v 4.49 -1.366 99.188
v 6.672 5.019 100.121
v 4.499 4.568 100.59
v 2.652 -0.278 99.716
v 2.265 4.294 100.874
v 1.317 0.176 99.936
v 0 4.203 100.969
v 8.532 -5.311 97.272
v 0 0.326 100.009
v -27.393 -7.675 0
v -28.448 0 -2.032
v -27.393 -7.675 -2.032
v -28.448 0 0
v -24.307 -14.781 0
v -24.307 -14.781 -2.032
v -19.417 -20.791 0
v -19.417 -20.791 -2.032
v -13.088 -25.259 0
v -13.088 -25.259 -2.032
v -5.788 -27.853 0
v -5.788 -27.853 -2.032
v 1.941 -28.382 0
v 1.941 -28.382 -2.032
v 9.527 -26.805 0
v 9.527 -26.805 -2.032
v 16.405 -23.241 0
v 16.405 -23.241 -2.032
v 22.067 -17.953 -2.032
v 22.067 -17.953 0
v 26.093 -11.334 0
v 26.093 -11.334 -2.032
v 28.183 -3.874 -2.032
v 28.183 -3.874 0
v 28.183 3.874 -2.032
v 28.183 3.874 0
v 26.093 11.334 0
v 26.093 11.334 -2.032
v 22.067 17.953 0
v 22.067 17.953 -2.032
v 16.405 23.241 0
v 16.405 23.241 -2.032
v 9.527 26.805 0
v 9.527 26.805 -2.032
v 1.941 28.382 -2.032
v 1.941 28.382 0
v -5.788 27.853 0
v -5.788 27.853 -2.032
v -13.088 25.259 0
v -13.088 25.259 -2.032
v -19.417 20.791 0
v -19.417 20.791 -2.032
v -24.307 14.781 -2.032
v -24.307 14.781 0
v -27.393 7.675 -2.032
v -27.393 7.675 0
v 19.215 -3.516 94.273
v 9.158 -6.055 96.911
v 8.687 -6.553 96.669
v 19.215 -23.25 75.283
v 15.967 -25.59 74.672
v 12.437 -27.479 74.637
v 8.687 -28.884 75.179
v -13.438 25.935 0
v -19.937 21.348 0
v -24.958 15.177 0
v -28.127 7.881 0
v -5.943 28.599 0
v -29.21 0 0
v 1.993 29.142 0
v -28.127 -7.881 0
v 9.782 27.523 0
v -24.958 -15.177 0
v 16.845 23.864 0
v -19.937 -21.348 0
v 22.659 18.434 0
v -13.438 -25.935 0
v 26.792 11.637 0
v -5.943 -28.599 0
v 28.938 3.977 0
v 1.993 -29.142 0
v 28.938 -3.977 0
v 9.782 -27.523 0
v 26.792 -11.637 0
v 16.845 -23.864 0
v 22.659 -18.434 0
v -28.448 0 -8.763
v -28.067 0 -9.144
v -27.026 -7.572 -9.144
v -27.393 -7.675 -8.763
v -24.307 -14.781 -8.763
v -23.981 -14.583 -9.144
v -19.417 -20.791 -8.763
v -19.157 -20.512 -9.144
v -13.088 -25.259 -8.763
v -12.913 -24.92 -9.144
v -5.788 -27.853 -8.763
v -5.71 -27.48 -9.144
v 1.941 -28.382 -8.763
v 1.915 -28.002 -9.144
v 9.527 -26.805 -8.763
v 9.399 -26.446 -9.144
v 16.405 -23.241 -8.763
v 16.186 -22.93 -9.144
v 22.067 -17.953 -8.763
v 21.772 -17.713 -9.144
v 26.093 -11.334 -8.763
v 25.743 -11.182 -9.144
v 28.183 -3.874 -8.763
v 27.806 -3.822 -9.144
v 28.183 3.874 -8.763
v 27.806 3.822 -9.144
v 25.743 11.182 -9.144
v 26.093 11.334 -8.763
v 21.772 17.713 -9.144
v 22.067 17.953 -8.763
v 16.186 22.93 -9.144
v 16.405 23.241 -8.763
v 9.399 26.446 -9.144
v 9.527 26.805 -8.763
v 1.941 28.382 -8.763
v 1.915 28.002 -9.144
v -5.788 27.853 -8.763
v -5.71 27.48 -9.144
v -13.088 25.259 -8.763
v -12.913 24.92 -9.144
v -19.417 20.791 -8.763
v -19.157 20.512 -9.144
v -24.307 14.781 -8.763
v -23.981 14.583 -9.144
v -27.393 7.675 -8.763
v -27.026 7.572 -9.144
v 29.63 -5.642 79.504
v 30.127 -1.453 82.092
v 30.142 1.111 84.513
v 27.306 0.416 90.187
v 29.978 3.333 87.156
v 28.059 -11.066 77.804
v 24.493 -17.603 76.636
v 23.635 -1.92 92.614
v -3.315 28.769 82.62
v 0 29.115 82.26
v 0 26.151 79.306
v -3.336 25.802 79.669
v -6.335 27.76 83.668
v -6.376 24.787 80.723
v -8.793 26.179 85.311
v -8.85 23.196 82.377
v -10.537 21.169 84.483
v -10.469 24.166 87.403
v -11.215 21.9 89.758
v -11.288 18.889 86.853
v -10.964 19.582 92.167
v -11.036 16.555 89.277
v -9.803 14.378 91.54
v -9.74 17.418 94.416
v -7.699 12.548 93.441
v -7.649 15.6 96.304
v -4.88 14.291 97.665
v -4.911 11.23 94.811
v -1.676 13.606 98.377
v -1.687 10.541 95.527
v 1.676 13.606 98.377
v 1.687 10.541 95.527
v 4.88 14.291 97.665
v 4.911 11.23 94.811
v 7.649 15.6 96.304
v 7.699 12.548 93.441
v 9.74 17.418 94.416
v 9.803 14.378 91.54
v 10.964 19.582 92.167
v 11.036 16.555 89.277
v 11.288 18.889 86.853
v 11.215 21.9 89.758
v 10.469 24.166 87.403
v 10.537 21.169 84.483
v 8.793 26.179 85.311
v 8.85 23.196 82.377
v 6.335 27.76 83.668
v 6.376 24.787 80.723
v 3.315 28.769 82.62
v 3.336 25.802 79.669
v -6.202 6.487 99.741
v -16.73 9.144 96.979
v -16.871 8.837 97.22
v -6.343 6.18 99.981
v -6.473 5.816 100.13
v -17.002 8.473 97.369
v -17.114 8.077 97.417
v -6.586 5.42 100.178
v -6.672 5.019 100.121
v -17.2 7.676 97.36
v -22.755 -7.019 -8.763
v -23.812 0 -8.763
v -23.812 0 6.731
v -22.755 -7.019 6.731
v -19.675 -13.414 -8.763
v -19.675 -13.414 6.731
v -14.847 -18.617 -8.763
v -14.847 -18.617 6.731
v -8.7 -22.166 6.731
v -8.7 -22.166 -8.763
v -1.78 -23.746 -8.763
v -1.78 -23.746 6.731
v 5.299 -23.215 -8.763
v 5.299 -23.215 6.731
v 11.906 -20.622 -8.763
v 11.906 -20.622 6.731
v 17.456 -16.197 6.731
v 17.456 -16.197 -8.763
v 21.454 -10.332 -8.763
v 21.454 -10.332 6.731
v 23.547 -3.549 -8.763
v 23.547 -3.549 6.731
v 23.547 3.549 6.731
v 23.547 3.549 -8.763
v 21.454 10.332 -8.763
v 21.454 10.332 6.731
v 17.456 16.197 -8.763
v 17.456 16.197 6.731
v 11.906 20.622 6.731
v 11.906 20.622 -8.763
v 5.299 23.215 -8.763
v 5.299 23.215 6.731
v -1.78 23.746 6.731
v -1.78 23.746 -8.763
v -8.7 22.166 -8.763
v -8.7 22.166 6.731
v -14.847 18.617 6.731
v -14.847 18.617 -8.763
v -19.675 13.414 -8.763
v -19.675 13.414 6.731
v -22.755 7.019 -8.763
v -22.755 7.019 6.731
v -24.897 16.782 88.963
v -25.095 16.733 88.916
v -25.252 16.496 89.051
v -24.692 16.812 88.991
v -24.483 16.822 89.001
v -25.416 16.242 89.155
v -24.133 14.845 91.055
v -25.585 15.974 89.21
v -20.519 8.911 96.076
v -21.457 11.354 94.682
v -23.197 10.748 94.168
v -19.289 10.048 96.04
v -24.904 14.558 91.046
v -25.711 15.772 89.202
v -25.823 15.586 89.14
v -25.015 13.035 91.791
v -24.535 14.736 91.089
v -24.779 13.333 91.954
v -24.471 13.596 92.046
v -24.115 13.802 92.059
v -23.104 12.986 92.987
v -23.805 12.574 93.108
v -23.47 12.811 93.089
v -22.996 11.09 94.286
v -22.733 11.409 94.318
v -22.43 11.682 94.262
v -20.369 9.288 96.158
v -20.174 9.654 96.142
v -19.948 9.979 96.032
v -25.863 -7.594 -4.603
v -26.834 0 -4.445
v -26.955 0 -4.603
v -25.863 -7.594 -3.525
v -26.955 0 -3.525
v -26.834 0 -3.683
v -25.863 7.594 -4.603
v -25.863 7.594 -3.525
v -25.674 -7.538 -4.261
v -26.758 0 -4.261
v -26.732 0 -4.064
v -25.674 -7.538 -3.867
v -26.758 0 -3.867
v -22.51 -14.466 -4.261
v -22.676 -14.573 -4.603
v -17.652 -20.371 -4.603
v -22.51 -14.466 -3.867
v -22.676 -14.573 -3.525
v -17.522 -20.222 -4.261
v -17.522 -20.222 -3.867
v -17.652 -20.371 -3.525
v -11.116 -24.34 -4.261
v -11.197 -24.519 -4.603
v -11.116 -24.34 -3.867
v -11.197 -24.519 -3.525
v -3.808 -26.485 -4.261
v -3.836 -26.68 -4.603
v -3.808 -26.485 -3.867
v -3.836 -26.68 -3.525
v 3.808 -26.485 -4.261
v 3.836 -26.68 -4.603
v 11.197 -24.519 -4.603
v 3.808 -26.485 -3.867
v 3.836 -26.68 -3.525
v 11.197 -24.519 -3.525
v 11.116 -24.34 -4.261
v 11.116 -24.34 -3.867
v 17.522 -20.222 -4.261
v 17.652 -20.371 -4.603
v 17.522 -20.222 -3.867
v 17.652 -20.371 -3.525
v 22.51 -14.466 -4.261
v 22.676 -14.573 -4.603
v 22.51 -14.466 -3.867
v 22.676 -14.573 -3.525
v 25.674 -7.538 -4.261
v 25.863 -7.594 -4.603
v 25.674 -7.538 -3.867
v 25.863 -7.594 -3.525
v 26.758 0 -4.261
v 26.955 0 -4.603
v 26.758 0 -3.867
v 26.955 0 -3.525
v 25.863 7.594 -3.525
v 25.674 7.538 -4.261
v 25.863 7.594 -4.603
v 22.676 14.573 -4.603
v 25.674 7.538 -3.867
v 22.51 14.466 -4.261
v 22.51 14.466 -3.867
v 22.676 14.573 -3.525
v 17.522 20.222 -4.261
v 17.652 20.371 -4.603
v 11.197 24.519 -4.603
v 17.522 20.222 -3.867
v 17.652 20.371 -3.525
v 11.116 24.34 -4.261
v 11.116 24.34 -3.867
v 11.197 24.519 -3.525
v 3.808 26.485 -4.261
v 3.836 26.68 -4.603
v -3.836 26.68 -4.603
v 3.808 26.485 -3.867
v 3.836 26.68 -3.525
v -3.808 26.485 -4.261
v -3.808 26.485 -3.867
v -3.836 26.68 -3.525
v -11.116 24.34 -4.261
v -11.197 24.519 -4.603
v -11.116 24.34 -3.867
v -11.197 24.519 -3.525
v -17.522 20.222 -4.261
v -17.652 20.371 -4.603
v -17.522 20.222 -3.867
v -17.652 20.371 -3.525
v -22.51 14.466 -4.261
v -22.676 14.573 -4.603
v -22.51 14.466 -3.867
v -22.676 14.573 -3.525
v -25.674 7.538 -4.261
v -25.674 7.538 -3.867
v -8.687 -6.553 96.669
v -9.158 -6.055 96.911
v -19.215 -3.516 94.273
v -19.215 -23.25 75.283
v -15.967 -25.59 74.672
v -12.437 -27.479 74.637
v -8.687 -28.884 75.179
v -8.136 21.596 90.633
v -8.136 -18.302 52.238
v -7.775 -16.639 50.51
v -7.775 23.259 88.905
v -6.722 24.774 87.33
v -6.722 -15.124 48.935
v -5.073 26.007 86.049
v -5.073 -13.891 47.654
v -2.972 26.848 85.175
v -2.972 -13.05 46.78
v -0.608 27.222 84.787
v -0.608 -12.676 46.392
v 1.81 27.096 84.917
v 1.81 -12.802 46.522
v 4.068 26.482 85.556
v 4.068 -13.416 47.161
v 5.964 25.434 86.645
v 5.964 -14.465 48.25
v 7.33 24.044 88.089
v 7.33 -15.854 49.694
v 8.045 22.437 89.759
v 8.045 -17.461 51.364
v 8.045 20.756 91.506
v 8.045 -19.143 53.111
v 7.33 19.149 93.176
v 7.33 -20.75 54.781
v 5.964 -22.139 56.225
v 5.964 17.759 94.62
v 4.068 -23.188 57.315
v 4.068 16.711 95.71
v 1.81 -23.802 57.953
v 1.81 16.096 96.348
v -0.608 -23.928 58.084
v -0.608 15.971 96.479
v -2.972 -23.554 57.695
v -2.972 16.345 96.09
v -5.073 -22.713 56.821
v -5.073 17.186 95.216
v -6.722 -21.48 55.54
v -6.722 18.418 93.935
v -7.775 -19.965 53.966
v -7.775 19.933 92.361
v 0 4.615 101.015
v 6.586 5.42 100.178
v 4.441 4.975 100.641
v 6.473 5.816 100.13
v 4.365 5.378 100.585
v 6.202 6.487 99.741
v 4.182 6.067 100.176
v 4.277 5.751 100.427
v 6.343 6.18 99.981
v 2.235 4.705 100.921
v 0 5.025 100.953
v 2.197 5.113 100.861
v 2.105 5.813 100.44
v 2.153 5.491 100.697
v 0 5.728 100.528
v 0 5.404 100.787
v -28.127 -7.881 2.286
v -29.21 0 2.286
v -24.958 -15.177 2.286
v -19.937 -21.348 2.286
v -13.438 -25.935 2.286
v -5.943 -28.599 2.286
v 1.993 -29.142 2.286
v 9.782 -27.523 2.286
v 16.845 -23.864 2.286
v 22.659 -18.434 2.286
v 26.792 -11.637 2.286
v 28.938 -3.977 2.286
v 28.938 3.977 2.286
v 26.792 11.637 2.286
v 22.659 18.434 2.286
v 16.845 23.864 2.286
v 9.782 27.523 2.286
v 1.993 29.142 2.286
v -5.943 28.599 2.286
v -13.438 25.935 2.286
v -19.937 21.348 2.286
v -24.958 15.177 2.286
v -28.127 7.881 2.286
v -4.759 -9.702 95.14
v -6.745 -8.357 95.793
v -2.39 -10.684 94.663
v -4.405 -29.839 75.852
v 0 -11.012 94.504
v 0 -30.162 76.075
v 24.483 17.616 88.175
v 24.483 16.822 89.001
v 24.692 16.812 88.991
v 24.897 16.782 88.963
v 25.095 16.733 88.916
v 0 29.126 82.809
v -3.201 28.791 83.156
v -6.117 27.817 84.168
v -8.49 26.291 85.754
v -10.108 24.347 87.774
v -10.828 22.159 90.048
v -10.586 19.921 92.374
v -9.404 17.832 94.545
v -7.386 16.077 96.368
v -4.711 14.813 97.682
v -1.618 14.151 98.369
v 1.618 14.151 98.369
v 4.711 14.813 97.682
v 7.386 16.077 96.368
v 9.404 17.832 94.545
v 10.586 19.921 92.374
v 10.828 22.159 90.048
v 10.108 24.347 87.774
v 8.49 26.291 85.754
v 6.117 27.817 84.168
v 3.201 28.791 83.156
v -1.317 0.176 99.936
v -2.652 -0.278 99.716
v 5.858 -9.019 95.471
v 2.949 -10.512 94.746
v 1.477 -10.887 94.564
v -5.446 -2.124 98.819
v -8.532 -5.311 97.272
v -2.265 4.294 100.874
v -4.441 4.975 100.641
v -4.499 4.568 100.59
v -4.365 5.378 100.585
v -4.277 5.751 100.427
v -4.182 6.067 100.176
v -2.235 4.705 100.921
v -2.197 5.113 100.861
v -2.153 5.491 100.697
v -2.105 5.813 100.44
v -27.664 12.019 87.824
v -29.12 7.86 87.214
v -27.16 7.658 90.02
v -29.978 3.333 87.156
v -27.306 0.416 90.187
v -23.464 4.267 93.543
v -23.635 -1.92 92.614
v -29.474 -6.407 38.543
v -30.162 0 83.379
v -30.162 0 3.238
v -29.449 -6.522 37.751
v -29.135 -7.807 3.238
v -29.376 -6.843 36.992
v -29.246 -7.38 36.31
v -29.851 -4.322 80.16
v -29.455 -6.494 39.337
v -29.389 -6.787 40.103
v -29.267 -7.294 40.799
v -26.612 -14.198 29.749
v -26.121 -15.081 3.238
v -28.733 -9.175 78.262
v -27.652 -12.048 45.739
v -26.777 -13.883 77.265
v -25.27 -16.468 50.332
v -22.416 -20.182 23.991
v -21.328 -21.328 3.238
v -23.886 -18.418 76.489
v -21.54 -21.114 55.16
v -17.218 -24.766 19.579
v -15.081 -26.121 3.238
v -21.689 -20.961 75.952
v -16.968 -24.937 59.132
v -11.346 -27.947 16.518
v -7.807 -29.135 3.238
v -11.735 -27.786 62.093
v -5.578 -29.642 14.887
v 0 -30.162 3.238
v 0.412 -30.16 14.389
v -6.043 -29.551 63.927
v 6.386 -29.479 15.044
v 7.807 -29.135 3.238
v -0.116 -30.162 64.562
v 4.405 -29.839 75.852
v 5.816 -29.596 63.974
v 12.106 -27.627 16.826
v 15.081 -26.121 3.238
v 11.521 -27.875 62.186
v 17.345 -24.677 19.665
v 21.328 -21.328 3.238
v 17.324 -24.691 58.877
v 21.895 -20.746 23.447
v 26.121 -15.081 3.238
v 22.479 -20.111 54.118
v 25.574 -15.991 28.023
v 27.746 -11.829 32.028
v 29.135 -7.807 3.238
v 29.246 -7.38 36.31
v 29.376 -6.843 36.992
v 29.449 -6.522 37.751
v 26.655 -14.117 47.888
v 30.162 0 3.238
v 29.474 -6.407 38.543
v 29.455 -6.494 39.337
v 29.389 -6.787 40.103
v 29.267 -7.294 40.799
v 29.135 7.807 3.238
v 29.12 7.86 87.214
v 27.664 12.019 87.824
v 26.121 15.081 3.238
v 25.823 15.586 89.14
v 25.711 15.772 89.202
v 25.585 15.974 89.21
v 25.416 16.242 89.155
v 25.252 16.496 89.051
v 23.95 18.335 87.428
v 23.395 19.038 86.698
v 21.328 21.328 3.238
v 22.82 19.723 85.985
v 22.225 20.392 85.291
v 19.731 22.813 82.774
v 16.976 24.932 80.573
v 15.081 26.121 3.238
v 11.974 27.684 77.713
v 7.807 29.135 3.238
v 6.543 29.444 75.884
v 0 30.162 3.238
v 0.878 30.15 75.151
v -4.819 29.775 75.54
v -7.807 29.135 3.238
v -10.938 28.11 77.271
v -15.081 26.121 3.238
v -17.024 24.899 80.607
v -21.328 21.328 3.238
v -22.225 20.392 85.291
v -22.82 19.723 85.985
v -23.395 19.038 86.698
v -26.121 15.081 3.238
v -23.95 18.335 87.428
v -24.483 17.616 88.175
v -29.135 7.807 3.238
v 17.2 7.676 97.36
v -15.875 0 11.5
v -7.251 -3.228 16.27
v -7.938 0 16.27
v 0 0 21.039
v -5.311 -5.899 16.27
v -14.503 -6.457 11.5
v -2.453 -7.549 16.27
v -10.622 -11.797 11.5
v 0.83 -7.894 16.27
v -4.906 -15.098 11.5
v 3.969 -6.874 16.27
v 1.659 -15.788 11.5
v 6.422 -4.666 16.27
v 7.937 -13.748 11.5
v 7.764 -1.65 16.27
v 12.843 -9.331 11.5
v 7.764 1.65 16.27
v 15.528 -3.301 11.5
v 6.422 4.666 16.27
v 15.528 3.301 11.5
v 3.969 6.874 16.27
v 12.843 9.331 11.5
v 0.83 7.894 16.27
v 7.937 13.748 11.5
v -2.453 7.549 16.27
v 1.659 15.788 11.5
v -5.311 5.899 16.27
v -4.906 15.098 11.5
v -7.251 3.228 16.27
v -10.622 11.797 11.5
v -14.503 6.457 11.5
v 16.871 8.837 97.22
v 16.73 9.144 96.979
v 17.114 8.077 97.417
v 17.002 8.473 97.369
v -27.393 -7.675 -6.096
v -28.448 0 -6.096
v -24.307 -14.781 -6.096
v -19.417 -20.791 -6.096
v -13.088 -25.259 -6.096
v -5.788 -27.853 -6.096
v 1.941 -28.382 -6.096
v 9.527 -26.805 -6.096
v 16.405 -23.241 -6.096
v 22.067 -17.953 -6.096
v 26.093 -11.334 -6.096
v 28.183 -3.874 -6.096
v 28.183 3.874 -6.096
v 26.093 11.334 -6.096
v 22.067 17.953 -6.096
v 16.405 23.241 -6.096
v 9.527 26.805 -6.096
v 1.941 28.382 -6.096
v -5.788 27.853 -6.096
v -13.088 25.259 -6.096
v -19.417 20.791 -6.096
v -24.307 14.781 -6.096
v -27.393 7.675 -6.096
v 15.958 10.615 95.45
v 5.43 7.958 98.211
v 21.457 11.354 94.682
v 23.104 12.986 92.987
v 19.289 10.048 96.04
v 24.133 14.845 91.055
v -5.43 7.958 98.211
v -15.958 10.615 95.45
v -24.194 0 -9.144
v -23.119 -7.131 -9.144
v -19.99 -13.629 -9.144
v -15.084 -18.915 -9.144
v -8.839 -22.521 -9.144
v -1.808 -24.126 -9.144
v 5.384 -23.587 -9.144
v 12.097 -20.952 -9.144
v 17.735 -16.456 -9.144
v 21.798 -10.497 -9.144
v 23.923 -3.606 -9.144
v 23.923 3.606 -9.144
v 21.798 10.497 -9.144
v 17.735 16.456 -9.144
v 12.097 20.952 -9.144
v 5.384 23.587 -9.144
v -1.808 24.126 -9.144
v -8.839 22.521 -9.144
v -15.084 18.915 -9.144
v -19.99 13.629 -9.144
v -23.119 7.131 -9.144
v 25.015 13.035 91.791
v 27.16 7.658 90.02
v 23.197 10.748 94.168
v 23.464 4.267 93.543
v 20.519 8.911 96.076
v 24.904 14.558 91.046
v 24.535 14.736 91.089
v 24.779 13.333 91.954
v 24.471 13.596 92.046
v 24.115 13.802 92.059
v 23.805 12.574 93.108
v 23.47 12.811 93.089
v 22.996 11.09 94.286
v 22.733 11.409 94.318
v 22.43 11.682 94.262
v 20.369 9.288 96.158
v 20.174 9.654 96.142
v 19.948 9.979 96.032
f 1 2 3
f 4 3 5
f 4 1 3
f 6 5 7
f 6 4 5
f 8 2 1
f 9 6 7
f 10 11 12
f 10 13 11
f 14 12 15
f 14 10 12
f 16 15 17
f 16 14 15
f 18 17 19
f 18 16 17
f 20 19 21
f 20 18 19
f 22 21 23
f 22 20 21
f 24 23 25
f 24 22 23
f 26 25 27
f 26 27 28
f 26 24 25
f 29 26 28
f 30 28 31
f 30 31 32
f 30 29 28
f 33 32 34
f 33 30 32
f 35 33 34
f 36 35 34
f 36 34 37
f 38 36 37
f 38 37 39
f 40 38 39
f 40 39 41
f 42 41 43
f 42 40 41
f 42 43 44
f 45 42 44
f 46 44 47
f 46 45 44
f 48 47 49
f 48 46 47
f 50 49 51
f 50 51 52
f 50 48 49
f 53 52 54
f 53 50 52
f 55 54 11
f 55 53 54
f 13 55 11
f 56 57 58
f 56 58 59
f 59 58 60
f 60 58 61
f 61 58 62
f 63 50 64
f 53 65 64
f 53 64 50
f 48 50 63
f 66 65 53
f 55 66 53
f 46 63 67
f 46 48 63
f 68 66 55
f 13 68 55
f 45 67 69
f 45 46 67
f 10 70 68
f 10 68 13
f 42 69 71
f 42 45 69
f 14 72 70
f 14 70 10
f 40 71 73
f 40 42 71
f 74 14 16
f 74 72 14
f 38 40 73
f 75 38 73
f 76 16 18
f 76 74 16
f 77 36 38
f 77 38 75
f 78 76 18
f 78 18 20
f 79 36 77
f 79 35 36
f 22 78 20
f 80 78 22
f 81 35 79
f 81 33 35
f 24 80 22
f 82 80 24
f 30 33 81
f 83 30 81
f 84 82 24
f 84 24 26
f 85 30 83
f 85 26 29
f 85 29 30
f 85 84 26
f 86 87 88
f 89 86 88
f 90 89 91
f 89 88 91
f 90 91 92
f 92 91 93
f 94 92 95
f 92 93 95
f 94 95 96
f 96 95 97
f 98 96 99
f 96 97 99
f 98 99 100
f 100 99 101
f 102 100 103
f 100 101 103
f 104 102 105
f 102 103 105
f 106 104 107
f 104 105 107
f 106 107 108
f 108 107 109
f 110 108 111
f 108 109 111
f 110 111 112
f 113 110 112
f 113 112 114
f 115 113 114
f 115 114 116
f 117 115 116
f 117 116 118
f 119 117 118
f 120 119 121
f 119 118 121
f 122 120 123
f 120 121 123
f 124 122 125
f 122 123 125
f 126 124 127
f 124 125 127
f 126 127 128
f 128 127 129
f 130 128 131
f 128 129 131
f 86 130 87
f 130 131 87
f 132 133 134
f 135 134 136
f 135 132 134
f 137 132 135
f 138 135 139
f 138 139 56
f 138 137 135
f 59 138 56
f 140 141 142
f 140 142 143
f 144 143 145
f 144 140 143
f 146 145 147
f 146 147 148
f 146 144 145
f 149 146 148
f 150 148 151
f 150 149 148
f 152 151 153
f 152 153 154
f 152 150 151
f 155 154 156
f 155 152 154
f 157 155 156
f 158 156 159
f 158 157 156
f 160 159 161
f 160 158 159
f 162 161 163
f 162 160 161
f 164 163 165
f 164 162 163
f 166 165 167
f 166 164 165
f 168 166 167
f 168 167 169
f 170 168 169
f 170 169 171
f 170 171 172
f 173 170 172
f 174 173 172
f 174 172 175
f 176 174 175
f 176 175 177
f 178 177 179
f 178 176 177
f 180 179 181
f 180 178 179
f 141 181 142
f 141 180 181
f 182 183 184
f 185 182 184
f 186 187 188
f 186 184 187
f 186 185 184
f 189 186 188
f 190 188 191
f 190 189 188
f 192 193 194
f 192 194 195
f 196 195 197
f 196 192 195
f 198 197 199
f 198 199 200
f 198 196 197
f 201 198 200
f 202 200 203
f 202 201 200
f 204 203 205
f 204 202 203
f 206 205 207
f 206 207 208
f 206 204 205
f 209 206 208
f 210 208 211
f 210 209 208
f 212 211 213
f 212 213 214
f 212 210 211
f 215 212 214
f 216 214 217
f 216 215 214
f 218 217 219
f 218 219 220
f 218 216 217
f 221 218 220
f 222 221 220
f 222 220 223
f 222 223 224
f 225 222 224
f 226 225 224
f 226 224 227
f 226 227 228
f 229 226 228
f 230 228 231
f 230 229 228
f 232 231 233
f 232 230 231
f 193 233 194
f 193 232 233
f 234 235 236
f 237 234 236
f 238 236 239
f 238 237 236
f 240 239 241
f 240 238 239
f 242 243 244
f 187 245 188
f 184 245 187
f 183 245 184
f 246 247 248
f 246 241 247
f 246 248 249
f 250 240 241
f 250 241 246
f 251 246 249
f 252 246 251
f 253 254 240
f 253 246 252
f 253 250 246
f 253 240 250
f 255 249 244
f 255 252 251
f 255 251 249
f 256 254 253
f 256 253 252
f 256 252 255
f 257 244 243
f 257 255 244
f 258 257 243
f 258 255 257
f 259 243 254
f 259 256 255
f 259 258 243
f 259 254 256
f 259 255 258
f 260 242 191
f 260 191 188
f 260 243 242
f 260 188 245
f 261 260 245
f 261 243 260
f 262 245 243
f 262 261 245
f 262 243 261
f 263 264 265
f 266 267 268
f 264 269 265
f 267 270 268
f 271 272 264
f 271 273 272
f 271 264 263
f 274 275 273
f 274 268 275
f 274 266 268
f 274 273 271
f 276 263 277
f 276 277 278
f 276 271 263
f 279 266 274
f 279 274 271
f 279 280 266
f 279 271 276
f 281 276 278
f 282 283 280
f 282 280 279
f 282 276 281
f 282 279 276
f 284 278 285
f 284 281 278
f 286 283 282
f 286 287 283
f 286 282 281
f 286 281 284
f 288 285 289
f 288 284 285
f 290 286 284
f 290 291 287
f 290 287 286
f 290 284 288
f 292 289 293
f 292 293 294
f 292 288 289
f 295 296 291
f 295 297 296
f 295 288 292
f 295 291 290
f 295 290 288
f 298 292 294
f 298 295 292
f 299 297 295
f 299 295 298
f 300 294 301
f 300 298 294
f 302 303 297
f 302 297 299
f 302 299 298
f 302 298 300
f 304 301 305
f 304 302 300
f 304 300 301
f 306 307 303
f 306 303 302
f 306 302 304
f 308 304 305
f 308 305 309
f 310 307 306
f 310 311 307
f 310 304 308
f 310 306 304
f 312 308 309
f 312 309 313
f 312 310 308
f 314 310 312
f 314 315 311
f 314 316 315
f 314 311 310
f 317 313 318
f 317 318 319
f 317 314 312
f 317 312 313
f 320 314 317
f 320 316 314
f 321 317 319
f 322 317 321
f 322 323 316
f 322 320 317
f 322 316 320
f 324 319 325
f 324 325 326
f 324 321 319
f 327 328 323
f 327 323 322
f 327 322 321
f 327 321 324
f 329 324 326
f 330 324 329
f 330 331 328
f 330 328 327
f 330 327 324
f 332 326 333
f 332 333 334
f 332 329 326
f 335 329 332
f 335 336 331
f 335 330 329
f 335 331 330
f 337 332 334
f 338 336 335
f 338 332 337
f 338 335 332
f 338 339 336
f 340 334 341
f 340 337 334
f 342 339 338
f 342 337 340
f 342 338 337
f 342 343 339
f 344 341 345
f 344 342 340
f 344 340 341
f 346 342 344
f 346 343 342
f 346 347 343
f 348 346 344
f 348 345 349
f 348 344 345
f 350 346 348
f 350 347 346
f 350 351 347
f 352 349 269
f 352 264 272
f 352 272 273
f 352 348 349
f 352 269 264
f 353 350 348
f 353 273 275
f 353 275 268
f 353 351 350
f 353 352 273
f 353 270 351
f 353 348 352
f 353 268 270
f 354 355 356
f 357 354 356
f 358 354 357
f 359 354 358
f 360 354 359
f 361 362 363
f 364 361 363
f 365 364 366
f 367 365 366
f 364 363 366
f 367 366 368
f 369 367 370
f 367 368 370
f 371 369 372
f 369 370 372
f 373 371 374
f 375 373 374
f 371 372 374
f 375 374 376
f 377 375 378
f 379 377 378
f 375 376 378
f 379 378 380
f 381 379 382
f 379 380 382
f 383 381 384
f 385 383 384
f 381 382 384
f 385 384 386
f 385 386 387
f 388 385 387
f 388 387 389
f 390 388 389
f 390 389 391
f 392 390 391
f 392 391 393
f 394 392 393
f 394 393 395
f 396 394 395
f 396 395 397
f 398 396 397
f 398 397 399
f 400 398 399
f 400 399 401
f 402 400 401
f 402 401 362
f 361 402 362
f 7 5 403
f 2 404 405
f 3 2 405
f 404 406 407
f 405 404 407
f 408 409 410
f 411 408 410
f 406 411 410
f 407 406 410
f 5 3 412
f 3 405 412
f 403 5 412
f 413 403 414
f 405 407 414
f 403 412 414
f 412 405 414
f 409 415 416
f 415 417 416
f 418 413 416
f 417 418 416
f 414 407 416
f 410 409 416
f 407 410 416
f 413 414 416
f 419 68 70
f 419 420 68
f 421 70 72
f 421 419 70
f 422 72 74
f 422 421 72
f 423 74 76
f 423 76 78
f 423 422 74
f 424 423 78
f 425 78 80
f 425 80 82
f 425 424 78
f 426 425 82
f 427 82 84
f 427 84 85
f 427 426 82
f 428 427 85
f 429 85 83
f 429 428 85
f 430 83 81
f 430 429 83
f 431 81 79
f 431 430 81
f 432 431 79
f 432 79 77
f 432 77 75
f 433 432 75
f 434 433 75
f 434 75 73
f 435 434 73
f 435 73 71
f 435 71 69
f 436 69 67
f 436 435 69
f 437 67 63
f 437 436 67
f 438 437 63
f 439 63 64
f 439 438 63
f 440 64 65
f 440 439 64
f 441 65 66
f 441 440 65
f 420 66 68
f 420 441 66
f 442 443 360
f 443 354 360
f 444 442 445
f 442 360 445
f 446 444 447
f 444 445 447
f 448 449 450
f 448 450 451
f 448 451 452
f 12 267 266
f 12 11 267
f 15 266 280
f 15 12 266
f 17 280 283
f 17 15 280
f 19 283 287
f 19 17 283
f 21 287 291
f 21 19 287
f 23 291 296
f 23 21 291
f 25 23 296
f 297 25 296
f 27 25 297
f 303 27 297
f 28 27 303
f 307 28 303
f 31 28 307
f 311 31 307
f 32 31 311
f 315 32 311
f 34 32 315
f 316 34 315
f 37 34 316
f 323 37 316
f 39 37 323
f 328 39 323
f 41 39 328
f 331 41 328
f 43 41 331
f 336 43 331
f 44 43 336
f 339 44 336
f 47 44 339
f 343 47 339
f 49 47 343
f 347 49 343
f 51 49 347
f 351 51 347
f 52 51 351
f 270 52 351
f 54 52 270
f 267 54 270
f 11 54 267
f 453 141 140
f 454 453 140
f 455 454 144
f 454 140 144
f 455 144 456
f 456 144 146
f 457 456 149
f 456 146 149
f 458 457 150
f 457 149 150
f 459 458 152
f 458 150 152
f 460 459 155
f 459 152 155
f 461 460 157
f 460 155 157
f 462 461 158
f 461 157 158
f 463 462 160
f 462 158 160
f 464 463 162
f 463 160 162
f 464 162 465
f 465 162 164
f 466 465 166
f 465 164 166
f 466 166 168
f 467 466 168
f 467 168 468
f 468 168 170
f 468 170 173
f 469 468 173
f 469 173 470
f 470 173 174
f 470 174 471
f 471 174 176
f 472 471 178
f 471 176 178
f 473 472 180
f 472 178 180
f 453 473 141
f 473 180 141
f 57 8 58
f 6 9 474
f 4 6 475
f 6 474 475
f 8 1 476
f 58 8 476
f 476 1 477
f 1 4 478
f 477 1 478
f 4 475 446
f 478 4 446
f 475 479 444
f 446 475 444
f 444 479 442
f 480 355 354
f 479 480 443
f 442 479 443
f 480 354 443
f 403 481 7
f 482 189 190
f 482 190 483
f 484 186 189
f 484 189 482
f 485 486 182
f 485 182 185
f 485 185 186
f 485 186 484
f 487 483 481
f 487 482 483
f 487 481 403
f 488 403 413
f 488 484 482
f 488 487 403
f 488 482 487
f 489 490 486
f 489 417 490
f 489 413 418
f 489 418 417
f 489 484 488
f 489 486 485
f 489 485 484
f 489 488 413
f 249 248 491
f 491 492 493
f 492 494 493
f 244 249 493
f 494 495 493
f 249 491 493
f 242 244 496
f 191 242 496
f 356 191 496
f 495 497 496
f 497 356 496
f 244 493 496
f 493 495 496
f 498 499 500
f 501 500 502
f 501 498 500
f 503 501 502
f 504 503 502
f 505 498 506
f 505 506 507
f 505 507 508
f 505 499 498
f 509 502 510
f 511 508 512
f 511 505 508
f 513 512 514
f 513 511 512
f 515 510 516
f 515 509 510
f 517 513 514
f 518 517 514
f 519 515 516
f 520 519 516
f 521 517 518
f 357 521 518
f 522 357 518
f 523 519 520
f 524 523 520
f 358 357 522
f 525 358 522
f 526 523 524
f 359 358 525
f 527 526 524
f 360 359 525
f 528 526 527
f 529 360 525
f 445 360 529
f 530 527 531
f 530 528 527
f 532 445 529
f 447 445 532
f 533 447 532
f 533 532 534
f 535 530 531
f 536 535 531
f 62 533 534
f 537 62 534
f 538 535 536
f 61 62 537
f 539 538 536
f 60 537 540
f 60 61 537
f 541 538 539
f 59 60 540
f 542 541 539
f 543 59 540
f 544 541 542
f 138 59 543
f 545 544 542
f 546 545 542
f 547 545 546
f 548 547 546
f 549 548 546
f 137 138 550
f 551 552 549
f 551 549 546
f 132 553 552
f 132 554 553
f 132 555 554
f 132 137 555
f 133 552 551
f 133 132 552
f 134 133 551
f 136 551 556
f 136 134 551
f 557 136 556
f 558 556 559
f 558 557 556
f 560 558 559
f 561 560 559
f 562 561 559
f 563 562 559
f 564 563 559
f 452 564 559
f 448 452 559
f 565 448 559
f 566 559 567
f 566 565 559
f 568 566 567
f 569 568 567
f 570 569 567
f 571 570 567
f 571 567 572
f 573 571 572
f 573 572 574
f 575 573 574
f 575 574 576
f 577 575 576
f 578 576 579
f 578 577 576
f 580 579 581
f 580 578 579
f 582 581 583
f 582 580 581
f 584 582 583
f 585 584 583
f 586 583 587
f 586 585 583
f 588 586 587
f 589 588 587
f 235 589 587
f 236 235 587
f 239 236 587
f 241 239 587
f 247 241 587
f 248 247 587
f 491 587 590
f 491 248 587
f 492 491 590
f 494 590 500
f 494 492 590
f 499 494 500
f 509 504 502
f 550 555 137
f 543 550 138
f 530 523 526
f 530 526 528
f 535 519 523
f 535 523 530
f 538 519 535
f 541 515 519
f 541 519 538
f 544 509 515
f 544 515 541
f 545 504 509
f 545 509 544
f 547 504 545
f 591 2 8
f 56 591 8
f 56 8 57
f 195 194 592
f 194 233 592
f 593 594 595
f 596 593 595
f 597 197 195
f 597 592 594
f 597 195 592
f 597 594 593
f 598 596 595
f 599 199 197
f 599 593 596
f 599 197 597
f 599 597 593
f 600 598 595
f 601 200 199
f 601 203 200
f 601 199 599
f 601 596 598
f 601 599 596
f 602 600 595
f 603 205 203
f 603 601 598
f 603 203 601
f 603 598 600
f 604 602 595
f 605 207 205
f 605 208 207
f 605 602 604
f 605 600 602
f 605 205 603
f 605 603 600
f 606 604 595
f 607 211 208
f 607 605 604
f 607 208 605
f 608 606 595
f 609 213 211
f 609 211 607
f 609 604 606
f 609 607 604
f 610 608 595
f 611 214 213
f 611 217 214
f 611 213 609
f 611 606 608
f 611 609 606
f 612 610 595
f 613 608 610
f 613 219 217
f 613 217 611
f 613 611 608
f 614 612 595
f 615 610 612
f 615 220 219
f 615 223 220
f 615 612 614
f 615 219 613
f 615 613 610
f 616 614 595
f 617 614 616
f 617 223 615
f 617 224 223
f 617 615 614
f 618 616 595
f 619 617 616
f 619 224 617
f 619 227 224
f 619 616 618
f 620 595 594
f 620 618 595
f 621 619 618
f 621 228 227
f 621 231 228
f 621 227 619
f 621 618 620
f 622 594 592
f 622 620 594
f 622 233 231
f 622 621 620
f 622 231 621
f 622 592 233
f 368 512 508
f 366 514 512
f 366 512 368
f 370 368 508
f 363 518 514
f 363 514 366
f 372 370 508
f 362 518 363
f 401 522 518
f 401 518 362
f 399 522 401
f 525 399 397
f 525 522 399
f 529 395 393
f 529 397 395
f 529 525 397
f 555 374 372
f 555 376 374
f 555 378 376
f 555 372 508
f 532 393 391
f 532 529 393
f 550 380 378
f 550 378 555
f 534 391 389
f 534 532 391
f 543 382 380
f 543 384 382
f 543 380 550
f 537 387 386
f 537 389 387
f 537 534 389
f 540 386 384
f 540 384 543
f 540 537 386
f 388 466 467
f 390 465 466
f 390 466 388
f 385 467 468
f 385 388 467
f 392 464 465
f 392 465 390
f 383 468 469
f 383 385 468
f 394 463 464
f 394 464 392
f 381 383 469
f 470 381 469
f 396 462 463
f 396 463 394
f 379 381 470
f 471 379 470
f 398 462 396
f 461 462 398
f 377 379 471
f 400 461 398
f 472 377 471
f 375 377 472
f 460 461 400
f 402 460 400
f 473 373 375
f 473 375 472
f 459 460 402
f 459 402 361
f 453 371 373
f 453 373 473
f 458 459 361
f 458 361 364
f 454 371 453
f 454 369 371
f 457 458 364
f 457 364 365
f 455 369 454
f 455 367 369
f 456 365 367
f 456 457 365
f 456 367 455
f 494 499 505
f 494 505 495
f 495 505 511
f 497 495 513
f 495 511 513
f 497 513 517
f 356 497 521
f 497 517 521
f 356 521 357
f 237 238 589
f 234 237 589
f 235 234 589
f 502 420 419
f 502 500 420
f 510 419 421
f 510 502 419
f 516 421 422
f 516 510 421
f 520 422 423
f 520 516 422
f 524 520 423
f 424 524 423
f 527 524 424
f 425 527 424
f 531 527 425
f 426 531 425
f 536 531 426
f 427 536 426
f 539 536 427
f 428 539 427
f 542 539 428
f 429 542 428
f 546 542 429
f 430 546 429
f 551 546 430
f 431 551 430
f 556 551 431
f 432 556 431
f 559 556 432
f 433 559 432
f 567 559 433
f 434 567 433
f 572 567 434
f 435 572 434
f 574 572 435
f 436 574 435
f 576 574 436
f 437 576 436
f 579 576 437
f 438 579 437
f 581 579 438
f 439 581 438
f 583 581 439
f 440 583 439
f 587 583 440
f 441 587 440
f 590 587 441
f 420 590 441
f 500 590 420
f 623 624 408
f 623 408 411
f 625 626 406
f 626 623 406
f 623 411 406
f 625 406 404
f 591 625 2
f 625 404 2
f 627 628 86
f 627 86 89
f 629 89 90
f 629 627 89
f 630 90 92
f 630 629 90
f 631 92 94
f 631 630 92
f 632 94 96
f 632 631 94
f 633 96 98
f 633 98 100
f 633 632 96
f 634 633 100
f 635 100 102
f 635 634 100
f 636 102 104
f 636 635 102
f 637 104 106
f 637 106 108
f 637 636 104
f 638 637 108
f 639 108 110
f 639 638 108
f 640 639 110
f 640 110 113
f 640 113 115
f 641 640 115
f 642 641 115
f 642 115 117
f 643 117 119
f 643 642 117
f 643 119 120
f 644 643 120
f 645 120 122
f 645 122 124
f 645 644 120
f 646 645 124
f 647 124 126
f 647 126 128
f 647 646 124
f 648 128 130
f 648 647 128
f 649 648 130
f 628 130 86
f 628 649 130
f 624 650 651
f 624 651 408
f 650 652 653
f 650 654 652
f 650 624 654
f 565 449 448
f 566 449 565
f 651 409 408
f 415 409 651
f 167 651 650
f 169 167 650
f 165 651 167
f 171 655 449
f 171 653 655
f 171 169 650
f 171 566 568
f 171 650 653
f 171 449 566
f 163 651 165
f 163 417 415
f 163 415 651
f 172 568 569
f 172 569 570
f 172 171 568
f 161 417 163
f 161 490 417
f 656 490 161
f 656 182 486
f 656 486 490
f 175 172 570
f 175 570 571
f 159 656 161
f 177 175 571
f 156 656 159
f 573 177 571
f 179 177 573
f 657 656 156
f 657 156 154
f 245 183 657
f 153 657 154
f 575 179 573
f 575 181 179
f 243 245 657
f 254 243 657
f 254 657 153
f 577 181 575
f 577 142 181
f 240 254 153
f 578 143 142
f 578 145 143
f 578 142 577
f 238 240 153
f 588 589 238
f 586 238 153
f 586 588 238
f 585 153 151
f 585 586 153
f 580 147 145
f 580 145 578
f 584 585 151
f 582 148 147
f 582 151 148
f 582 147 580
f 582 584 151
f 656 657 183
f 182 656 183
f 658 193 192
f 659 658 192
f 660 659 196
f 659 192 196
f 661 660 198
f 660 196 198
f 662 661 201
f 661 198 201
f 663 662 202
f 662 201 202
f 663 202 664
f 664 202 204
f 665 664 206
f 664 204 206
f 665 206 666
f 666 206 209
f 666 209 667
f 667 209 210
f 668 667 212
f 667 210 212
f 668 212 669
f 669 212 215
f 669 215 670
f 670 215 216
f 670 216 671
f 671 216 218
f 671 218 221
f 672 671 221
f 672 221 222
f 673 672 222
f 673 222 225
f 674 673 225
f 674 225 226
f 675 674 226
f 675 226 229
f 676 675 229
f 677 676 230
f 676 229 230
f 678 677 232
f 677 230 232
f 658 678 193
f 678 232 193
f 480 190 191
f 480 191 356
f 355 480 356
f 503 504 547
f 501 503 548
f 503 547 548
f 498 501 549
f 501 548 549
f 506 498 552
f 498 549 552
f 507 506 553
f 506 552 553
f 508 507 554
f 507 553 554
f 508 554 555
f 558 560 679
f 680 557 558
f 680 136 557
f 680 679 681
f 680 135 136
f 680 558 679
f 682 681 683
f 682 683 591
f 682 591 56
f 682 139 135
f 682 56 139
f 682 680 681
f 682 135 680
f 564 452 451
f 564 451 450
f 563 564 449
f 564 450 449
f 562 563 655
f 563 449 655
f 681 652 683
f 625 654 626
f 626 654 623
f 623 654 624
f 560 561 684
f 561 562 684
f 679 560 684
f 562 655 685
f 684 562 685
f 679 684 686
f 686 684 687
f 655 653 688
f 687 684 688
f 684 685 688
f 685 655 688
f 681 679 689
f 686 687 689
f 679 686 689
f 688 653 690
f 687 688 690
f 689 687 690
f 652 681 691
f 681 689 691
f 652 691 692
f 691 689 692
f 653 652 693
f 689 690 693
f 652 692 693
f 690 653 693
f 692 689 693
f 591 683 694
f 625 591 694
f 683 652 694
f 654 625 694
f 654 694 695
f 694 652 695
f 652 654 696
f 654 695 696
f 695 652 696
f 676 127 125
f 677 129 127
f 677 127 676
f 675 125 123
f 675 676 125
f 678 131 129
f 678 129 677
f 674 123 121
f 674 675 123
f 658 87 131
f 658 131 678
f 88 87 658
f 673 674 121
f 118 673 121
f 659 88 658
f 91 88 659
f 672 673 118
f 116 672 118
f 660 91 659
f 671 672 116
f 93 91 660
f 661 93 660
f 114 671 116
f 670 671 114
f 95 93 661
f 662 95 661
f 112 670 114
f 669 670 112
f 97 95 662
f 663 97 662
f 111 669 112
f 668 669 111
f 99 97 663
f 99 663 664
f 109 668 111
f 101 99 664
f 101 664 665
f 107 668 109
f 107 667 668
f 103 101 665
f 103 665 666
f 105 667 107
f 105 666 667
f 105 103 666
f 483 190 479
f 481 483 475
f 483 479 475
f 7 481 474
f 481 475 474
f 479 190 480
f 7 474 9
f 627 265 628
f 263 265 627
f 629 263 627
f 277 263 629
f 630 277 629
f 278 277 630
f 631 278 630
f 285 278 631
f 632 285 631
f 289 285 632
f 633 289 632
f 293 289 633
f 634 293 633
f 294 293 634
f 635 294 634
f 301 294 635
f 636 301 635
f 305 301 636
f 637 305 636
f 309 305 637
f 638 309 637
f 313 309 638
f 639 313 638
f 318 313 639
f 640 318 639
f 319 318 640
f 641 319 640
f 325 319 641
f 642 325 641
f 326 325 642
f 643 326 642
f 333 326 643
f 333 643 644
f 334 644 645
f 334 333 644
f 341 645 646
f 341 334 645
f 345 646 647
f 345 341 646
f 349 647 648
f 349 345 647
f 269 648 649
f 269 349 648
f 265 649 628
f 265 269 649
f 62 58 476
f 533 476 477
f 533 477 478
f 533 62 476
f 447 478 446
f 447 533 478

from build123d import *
from OCP.BRepFilletAPI import BRepFilletAPI_MakeChamfer

# Parameters (mm, degrees)
F_41_64_0_640630_DIAMETER_HOLE1_D = 16.272002
SKETCH7_W                         = 76.989658396
SKETCH7_H                         = 50.8
FCE_00_BOLT_HEAD_NOTCH_DEPTH      = 50.8
FILLET1_R                         = 3.175
CHAMFER1_SIZE                     = 0.381
CHAMFER1_SIZE2                    = 0.387827593
CUT_EXTRUDE1_DEPTH                = 110.652296603
CUT_EXTRUDE1_DEPTH_BACK           = 110.652296603


with BuildPart() as part:
    # Sketch3 → FBR-00 Basic blank revolve. (revolve)
    with BuildSketch(Plane(origin=(0, 0, 0), x_dir=(0, 0, -1), z_dir=(1, 0, 0)), mode=Mode.PRIVATE) as fbr_00_basic_blank_revolve_sk:
        with BuildLine():
            Line((-101.188905116, 30.1625), (-101.188905116, 0))
            Line((-101.188905116, 0), (-21.038993491, 0))
            Line((-21.038993491, 0), (-6.731, 23.8125))
            Line((-6.731, 23.8125), (9.144, 23.8125))
            Line((9.144, 23.8125), (9.144, 28.448))
            Line((9.144, 28.448), (6.096, 28.448))
            Line((6.096, 28.448), (4.602815367, 26.954815367))
            ThreePointArc((4.602815367, 26.954815367), (4.064, 26.731630735), (3.525184633, 26.954815367))
            Line((3.525184633, 26.954815367), (2.032, 28.448))
            Line((2.032, 28.448), (0, 28.448))
            Line((0, 28.448), (0, 29.21))
            Line((0, 29.21), (-2.286, 29.21))
            Line((-2.286, 29.21), (-3.2385, 30.1625))
            Line((-3.2385, 30.1625), (-101.188905116, 30.1625))
        make_face()
    revolve(fbr_00_basic_blank_revolve_sk.sketch.rotate(Axis((0, 0, -27.766671499), (0, 0, 1)), 90), axis=Axis((0, 0, -27.766671499), (0, 0, 1)))

    # Sketch13 → FCR-00 lacation boss, Cut-Revolve. (revolve, cut)
    with BuildSketch(Plane(origin=(0, 0, 0), x_dir=(0, 0, -1), z_dir=(1, 0, 0))):
        Polygon((-60.009409083, 44.720607894), (-79.306268956, 26.150824711), (-82.534005377, 29.389847768), (-90.632639597, 21.596357919), (-105.074812876, 36.603996473), (-77.621815521, 63.022606131), align=None)
    revolve(axis=Axis((0, 36.603996473, 105.074812876), (0, 0.720551111680328, 0.6934018282758155)), mode=Mode.SUBTRACT)

    # 41/64 (0.640630) Diameter Hole1 (through all)
    with Locations(Plane(origin=(0, 56.495615275, 54.366945365), x_dir=(1, 0, 0), z_dir=(0, 0.720551111680328, 0.6934018282758155))):
        with Locations((0, -50.330495151)):
            Hole(F_41_64_0_640630_DIAMETER_HOLE1_D / 2)

    # FCS-00 End trim, Cut-Sweep: sweep along a path in Sketch6
    with BuildLine(Plane(origin=(0, 53.201255592, 51.196712206), x_dir=(1, 0, 0), z_dir=(0, 0.720551111680328, 0.6934018282758155))) as fcs_00_end_trim_cut_sweep_path:
        Line((-25.4, -39.765602031), (-25.4, -52.465602031))
        ThreePointArc((-25.4, -52.465602031), (-23.103230962, -59.750022773), (-17.04365582, -64.399698315))
        Line((-17.04365582, -64.399698315), (-6.51548373, -68.231639577))
        ThreePointArc((-6.51548373, -68.231639577), (-3.307997785, -69.091082846), (0, -69.380495151))
    # Sketch16 → FCS-00 End trim, Cut-Sweep (sweep, cut)
    with BuildSketch(Plane(origin=(0, 117.771567215, -110.982310617), x_dir=(0, -0.9982398279237649, -0.059306373575968775), z_dir=(-1, 0, 0))):
        with BuildLine():
            Line((152.30720814, 182.06896008), (168.803188567, 201.383271607))
            Line((168.803188567, 201.383271607), (110.860253989, 250.871212889))
            Line((110.860253989, 250.871212889), (88.178280901, 224.314034541))
            Line((88.178280901, 224.314034541), (97.835436664, 216.066044327))
            Line((97.835436664, 216.066044327), (99.302186796, 217.783388083))
            ThreePointArc((99.302186796, 217.783388083), (99.979412877, 218.248832673), (100.798630163, 218.313306472))
            Line((100.798630163, 218.313306472), (112.384771543, 216.165942094))
            Line((112.384771543, 216.165942094), (152.30720814, 182.06896008))
        make_face()
    fcs_00_end_trim_cut_sweep = sweep(path=fcs_00_end_trim_cut_sweep_path.line, mode=Mode.SUBTRACT)

    # FMR-00 Mirror end trim.: FCS-00 End trim, Cut-Sweep across plane
    add(fcs_00_end_trim_cut_sweep.mirror(Plane(origin=(0, 0, 0), x_dir=(0, 0, 1), z_dir=(1, 0, 0))), mode=Mode.SUBTRACT)

    # Sketch7 → FCE-00 Bolt head notch. (cut)
    with BuildSketch(Plane(origin=(0, -18.301998237, 52.237593562), x_dir=(1, 0, 0), z_dir=(0, -0.7205511116803286, -0.6934018282758149))):
        with Locations((0, 6.35)):
            Rectangle(SKETCH7_W, SKETCH7_H)
    extrude(amount=FCE_00_BOLT_HEAD_NOTCH_DEPTH, mode=Mode.SUBTRACT)

    # Fillet1
    fillet1_edges = [part.edges().sort_by_distance(p)[0] for p in [
        (0, -5.092693408, 38.511094884),
    ]]
    fillet(fillet1_edges, radius=FILLET1_R)

    # Chamfer1: one chamfer whose edges measure the first distance from different faces: ONE call of the kernel's chamfer builder (chamfer() names one face for all edges)
    chamfer1_edges_1 = [part.edges().sort_by_distance(p)[0] for p in [
        (28.448, 0, -9.144),
        (23.8125, 0, -9.144),
    ]]
    chamfer1_edges_2 = [part.edges().sort_by_distance(p)[0] for p in [
        (0, 13.80286807, 98.731273817),
    ]]
    chamfer1_side_2 = [part.faces().sort_by_distance(p)[0] for p in [
        (0, 14.023301251, 98.50220985),
    ]]
    chamfer1 = BRepFilletAPI_MakeChamfer(part.part.solid().wrapped)
    for e in chamfer1_edges_1:
        chamfer1.Add(CHAMFER1_SIZE, e.wrapped)
    for e in chamfer1_edges_2:
        chamfer1.Add(CHAMFER1_SIZE, CHAMFER1_SIZE2, e.wrapped, chamfer1_side_2[0].wrapped)  # the first distance lies on this face
    add(Compound.cast(chamfer1.Shape()), mode=Mode.REPLACE)

    # Sketch17 → Cut-Extrude1 (cut, two sides: drawn at the far end of the back side and taken through both)
    with BuildSketch(Plane(origin=(0, 0, 0), x_dir=(0, 0, -1), z_dir=(1, 0, 0)).offset(-CUT_EXTRUDE1_DEPTH_BACK)):
        Polygon((-220.872013196, 249.233244147), (-107.294691274, 15.329981457), (-88.096461038, -24.20721324), (25.480860884, -258.110475929), (-442.325664495, -485.265119773), (-688.678538575, 22.078600303), align=None)
    extrude(amount=CUT_EXTRUDE1_DEPTH + CUT_EXTRUDE1_DEPTH_BACK, mode=Mode.SUBTRACT)


solid = part.part
